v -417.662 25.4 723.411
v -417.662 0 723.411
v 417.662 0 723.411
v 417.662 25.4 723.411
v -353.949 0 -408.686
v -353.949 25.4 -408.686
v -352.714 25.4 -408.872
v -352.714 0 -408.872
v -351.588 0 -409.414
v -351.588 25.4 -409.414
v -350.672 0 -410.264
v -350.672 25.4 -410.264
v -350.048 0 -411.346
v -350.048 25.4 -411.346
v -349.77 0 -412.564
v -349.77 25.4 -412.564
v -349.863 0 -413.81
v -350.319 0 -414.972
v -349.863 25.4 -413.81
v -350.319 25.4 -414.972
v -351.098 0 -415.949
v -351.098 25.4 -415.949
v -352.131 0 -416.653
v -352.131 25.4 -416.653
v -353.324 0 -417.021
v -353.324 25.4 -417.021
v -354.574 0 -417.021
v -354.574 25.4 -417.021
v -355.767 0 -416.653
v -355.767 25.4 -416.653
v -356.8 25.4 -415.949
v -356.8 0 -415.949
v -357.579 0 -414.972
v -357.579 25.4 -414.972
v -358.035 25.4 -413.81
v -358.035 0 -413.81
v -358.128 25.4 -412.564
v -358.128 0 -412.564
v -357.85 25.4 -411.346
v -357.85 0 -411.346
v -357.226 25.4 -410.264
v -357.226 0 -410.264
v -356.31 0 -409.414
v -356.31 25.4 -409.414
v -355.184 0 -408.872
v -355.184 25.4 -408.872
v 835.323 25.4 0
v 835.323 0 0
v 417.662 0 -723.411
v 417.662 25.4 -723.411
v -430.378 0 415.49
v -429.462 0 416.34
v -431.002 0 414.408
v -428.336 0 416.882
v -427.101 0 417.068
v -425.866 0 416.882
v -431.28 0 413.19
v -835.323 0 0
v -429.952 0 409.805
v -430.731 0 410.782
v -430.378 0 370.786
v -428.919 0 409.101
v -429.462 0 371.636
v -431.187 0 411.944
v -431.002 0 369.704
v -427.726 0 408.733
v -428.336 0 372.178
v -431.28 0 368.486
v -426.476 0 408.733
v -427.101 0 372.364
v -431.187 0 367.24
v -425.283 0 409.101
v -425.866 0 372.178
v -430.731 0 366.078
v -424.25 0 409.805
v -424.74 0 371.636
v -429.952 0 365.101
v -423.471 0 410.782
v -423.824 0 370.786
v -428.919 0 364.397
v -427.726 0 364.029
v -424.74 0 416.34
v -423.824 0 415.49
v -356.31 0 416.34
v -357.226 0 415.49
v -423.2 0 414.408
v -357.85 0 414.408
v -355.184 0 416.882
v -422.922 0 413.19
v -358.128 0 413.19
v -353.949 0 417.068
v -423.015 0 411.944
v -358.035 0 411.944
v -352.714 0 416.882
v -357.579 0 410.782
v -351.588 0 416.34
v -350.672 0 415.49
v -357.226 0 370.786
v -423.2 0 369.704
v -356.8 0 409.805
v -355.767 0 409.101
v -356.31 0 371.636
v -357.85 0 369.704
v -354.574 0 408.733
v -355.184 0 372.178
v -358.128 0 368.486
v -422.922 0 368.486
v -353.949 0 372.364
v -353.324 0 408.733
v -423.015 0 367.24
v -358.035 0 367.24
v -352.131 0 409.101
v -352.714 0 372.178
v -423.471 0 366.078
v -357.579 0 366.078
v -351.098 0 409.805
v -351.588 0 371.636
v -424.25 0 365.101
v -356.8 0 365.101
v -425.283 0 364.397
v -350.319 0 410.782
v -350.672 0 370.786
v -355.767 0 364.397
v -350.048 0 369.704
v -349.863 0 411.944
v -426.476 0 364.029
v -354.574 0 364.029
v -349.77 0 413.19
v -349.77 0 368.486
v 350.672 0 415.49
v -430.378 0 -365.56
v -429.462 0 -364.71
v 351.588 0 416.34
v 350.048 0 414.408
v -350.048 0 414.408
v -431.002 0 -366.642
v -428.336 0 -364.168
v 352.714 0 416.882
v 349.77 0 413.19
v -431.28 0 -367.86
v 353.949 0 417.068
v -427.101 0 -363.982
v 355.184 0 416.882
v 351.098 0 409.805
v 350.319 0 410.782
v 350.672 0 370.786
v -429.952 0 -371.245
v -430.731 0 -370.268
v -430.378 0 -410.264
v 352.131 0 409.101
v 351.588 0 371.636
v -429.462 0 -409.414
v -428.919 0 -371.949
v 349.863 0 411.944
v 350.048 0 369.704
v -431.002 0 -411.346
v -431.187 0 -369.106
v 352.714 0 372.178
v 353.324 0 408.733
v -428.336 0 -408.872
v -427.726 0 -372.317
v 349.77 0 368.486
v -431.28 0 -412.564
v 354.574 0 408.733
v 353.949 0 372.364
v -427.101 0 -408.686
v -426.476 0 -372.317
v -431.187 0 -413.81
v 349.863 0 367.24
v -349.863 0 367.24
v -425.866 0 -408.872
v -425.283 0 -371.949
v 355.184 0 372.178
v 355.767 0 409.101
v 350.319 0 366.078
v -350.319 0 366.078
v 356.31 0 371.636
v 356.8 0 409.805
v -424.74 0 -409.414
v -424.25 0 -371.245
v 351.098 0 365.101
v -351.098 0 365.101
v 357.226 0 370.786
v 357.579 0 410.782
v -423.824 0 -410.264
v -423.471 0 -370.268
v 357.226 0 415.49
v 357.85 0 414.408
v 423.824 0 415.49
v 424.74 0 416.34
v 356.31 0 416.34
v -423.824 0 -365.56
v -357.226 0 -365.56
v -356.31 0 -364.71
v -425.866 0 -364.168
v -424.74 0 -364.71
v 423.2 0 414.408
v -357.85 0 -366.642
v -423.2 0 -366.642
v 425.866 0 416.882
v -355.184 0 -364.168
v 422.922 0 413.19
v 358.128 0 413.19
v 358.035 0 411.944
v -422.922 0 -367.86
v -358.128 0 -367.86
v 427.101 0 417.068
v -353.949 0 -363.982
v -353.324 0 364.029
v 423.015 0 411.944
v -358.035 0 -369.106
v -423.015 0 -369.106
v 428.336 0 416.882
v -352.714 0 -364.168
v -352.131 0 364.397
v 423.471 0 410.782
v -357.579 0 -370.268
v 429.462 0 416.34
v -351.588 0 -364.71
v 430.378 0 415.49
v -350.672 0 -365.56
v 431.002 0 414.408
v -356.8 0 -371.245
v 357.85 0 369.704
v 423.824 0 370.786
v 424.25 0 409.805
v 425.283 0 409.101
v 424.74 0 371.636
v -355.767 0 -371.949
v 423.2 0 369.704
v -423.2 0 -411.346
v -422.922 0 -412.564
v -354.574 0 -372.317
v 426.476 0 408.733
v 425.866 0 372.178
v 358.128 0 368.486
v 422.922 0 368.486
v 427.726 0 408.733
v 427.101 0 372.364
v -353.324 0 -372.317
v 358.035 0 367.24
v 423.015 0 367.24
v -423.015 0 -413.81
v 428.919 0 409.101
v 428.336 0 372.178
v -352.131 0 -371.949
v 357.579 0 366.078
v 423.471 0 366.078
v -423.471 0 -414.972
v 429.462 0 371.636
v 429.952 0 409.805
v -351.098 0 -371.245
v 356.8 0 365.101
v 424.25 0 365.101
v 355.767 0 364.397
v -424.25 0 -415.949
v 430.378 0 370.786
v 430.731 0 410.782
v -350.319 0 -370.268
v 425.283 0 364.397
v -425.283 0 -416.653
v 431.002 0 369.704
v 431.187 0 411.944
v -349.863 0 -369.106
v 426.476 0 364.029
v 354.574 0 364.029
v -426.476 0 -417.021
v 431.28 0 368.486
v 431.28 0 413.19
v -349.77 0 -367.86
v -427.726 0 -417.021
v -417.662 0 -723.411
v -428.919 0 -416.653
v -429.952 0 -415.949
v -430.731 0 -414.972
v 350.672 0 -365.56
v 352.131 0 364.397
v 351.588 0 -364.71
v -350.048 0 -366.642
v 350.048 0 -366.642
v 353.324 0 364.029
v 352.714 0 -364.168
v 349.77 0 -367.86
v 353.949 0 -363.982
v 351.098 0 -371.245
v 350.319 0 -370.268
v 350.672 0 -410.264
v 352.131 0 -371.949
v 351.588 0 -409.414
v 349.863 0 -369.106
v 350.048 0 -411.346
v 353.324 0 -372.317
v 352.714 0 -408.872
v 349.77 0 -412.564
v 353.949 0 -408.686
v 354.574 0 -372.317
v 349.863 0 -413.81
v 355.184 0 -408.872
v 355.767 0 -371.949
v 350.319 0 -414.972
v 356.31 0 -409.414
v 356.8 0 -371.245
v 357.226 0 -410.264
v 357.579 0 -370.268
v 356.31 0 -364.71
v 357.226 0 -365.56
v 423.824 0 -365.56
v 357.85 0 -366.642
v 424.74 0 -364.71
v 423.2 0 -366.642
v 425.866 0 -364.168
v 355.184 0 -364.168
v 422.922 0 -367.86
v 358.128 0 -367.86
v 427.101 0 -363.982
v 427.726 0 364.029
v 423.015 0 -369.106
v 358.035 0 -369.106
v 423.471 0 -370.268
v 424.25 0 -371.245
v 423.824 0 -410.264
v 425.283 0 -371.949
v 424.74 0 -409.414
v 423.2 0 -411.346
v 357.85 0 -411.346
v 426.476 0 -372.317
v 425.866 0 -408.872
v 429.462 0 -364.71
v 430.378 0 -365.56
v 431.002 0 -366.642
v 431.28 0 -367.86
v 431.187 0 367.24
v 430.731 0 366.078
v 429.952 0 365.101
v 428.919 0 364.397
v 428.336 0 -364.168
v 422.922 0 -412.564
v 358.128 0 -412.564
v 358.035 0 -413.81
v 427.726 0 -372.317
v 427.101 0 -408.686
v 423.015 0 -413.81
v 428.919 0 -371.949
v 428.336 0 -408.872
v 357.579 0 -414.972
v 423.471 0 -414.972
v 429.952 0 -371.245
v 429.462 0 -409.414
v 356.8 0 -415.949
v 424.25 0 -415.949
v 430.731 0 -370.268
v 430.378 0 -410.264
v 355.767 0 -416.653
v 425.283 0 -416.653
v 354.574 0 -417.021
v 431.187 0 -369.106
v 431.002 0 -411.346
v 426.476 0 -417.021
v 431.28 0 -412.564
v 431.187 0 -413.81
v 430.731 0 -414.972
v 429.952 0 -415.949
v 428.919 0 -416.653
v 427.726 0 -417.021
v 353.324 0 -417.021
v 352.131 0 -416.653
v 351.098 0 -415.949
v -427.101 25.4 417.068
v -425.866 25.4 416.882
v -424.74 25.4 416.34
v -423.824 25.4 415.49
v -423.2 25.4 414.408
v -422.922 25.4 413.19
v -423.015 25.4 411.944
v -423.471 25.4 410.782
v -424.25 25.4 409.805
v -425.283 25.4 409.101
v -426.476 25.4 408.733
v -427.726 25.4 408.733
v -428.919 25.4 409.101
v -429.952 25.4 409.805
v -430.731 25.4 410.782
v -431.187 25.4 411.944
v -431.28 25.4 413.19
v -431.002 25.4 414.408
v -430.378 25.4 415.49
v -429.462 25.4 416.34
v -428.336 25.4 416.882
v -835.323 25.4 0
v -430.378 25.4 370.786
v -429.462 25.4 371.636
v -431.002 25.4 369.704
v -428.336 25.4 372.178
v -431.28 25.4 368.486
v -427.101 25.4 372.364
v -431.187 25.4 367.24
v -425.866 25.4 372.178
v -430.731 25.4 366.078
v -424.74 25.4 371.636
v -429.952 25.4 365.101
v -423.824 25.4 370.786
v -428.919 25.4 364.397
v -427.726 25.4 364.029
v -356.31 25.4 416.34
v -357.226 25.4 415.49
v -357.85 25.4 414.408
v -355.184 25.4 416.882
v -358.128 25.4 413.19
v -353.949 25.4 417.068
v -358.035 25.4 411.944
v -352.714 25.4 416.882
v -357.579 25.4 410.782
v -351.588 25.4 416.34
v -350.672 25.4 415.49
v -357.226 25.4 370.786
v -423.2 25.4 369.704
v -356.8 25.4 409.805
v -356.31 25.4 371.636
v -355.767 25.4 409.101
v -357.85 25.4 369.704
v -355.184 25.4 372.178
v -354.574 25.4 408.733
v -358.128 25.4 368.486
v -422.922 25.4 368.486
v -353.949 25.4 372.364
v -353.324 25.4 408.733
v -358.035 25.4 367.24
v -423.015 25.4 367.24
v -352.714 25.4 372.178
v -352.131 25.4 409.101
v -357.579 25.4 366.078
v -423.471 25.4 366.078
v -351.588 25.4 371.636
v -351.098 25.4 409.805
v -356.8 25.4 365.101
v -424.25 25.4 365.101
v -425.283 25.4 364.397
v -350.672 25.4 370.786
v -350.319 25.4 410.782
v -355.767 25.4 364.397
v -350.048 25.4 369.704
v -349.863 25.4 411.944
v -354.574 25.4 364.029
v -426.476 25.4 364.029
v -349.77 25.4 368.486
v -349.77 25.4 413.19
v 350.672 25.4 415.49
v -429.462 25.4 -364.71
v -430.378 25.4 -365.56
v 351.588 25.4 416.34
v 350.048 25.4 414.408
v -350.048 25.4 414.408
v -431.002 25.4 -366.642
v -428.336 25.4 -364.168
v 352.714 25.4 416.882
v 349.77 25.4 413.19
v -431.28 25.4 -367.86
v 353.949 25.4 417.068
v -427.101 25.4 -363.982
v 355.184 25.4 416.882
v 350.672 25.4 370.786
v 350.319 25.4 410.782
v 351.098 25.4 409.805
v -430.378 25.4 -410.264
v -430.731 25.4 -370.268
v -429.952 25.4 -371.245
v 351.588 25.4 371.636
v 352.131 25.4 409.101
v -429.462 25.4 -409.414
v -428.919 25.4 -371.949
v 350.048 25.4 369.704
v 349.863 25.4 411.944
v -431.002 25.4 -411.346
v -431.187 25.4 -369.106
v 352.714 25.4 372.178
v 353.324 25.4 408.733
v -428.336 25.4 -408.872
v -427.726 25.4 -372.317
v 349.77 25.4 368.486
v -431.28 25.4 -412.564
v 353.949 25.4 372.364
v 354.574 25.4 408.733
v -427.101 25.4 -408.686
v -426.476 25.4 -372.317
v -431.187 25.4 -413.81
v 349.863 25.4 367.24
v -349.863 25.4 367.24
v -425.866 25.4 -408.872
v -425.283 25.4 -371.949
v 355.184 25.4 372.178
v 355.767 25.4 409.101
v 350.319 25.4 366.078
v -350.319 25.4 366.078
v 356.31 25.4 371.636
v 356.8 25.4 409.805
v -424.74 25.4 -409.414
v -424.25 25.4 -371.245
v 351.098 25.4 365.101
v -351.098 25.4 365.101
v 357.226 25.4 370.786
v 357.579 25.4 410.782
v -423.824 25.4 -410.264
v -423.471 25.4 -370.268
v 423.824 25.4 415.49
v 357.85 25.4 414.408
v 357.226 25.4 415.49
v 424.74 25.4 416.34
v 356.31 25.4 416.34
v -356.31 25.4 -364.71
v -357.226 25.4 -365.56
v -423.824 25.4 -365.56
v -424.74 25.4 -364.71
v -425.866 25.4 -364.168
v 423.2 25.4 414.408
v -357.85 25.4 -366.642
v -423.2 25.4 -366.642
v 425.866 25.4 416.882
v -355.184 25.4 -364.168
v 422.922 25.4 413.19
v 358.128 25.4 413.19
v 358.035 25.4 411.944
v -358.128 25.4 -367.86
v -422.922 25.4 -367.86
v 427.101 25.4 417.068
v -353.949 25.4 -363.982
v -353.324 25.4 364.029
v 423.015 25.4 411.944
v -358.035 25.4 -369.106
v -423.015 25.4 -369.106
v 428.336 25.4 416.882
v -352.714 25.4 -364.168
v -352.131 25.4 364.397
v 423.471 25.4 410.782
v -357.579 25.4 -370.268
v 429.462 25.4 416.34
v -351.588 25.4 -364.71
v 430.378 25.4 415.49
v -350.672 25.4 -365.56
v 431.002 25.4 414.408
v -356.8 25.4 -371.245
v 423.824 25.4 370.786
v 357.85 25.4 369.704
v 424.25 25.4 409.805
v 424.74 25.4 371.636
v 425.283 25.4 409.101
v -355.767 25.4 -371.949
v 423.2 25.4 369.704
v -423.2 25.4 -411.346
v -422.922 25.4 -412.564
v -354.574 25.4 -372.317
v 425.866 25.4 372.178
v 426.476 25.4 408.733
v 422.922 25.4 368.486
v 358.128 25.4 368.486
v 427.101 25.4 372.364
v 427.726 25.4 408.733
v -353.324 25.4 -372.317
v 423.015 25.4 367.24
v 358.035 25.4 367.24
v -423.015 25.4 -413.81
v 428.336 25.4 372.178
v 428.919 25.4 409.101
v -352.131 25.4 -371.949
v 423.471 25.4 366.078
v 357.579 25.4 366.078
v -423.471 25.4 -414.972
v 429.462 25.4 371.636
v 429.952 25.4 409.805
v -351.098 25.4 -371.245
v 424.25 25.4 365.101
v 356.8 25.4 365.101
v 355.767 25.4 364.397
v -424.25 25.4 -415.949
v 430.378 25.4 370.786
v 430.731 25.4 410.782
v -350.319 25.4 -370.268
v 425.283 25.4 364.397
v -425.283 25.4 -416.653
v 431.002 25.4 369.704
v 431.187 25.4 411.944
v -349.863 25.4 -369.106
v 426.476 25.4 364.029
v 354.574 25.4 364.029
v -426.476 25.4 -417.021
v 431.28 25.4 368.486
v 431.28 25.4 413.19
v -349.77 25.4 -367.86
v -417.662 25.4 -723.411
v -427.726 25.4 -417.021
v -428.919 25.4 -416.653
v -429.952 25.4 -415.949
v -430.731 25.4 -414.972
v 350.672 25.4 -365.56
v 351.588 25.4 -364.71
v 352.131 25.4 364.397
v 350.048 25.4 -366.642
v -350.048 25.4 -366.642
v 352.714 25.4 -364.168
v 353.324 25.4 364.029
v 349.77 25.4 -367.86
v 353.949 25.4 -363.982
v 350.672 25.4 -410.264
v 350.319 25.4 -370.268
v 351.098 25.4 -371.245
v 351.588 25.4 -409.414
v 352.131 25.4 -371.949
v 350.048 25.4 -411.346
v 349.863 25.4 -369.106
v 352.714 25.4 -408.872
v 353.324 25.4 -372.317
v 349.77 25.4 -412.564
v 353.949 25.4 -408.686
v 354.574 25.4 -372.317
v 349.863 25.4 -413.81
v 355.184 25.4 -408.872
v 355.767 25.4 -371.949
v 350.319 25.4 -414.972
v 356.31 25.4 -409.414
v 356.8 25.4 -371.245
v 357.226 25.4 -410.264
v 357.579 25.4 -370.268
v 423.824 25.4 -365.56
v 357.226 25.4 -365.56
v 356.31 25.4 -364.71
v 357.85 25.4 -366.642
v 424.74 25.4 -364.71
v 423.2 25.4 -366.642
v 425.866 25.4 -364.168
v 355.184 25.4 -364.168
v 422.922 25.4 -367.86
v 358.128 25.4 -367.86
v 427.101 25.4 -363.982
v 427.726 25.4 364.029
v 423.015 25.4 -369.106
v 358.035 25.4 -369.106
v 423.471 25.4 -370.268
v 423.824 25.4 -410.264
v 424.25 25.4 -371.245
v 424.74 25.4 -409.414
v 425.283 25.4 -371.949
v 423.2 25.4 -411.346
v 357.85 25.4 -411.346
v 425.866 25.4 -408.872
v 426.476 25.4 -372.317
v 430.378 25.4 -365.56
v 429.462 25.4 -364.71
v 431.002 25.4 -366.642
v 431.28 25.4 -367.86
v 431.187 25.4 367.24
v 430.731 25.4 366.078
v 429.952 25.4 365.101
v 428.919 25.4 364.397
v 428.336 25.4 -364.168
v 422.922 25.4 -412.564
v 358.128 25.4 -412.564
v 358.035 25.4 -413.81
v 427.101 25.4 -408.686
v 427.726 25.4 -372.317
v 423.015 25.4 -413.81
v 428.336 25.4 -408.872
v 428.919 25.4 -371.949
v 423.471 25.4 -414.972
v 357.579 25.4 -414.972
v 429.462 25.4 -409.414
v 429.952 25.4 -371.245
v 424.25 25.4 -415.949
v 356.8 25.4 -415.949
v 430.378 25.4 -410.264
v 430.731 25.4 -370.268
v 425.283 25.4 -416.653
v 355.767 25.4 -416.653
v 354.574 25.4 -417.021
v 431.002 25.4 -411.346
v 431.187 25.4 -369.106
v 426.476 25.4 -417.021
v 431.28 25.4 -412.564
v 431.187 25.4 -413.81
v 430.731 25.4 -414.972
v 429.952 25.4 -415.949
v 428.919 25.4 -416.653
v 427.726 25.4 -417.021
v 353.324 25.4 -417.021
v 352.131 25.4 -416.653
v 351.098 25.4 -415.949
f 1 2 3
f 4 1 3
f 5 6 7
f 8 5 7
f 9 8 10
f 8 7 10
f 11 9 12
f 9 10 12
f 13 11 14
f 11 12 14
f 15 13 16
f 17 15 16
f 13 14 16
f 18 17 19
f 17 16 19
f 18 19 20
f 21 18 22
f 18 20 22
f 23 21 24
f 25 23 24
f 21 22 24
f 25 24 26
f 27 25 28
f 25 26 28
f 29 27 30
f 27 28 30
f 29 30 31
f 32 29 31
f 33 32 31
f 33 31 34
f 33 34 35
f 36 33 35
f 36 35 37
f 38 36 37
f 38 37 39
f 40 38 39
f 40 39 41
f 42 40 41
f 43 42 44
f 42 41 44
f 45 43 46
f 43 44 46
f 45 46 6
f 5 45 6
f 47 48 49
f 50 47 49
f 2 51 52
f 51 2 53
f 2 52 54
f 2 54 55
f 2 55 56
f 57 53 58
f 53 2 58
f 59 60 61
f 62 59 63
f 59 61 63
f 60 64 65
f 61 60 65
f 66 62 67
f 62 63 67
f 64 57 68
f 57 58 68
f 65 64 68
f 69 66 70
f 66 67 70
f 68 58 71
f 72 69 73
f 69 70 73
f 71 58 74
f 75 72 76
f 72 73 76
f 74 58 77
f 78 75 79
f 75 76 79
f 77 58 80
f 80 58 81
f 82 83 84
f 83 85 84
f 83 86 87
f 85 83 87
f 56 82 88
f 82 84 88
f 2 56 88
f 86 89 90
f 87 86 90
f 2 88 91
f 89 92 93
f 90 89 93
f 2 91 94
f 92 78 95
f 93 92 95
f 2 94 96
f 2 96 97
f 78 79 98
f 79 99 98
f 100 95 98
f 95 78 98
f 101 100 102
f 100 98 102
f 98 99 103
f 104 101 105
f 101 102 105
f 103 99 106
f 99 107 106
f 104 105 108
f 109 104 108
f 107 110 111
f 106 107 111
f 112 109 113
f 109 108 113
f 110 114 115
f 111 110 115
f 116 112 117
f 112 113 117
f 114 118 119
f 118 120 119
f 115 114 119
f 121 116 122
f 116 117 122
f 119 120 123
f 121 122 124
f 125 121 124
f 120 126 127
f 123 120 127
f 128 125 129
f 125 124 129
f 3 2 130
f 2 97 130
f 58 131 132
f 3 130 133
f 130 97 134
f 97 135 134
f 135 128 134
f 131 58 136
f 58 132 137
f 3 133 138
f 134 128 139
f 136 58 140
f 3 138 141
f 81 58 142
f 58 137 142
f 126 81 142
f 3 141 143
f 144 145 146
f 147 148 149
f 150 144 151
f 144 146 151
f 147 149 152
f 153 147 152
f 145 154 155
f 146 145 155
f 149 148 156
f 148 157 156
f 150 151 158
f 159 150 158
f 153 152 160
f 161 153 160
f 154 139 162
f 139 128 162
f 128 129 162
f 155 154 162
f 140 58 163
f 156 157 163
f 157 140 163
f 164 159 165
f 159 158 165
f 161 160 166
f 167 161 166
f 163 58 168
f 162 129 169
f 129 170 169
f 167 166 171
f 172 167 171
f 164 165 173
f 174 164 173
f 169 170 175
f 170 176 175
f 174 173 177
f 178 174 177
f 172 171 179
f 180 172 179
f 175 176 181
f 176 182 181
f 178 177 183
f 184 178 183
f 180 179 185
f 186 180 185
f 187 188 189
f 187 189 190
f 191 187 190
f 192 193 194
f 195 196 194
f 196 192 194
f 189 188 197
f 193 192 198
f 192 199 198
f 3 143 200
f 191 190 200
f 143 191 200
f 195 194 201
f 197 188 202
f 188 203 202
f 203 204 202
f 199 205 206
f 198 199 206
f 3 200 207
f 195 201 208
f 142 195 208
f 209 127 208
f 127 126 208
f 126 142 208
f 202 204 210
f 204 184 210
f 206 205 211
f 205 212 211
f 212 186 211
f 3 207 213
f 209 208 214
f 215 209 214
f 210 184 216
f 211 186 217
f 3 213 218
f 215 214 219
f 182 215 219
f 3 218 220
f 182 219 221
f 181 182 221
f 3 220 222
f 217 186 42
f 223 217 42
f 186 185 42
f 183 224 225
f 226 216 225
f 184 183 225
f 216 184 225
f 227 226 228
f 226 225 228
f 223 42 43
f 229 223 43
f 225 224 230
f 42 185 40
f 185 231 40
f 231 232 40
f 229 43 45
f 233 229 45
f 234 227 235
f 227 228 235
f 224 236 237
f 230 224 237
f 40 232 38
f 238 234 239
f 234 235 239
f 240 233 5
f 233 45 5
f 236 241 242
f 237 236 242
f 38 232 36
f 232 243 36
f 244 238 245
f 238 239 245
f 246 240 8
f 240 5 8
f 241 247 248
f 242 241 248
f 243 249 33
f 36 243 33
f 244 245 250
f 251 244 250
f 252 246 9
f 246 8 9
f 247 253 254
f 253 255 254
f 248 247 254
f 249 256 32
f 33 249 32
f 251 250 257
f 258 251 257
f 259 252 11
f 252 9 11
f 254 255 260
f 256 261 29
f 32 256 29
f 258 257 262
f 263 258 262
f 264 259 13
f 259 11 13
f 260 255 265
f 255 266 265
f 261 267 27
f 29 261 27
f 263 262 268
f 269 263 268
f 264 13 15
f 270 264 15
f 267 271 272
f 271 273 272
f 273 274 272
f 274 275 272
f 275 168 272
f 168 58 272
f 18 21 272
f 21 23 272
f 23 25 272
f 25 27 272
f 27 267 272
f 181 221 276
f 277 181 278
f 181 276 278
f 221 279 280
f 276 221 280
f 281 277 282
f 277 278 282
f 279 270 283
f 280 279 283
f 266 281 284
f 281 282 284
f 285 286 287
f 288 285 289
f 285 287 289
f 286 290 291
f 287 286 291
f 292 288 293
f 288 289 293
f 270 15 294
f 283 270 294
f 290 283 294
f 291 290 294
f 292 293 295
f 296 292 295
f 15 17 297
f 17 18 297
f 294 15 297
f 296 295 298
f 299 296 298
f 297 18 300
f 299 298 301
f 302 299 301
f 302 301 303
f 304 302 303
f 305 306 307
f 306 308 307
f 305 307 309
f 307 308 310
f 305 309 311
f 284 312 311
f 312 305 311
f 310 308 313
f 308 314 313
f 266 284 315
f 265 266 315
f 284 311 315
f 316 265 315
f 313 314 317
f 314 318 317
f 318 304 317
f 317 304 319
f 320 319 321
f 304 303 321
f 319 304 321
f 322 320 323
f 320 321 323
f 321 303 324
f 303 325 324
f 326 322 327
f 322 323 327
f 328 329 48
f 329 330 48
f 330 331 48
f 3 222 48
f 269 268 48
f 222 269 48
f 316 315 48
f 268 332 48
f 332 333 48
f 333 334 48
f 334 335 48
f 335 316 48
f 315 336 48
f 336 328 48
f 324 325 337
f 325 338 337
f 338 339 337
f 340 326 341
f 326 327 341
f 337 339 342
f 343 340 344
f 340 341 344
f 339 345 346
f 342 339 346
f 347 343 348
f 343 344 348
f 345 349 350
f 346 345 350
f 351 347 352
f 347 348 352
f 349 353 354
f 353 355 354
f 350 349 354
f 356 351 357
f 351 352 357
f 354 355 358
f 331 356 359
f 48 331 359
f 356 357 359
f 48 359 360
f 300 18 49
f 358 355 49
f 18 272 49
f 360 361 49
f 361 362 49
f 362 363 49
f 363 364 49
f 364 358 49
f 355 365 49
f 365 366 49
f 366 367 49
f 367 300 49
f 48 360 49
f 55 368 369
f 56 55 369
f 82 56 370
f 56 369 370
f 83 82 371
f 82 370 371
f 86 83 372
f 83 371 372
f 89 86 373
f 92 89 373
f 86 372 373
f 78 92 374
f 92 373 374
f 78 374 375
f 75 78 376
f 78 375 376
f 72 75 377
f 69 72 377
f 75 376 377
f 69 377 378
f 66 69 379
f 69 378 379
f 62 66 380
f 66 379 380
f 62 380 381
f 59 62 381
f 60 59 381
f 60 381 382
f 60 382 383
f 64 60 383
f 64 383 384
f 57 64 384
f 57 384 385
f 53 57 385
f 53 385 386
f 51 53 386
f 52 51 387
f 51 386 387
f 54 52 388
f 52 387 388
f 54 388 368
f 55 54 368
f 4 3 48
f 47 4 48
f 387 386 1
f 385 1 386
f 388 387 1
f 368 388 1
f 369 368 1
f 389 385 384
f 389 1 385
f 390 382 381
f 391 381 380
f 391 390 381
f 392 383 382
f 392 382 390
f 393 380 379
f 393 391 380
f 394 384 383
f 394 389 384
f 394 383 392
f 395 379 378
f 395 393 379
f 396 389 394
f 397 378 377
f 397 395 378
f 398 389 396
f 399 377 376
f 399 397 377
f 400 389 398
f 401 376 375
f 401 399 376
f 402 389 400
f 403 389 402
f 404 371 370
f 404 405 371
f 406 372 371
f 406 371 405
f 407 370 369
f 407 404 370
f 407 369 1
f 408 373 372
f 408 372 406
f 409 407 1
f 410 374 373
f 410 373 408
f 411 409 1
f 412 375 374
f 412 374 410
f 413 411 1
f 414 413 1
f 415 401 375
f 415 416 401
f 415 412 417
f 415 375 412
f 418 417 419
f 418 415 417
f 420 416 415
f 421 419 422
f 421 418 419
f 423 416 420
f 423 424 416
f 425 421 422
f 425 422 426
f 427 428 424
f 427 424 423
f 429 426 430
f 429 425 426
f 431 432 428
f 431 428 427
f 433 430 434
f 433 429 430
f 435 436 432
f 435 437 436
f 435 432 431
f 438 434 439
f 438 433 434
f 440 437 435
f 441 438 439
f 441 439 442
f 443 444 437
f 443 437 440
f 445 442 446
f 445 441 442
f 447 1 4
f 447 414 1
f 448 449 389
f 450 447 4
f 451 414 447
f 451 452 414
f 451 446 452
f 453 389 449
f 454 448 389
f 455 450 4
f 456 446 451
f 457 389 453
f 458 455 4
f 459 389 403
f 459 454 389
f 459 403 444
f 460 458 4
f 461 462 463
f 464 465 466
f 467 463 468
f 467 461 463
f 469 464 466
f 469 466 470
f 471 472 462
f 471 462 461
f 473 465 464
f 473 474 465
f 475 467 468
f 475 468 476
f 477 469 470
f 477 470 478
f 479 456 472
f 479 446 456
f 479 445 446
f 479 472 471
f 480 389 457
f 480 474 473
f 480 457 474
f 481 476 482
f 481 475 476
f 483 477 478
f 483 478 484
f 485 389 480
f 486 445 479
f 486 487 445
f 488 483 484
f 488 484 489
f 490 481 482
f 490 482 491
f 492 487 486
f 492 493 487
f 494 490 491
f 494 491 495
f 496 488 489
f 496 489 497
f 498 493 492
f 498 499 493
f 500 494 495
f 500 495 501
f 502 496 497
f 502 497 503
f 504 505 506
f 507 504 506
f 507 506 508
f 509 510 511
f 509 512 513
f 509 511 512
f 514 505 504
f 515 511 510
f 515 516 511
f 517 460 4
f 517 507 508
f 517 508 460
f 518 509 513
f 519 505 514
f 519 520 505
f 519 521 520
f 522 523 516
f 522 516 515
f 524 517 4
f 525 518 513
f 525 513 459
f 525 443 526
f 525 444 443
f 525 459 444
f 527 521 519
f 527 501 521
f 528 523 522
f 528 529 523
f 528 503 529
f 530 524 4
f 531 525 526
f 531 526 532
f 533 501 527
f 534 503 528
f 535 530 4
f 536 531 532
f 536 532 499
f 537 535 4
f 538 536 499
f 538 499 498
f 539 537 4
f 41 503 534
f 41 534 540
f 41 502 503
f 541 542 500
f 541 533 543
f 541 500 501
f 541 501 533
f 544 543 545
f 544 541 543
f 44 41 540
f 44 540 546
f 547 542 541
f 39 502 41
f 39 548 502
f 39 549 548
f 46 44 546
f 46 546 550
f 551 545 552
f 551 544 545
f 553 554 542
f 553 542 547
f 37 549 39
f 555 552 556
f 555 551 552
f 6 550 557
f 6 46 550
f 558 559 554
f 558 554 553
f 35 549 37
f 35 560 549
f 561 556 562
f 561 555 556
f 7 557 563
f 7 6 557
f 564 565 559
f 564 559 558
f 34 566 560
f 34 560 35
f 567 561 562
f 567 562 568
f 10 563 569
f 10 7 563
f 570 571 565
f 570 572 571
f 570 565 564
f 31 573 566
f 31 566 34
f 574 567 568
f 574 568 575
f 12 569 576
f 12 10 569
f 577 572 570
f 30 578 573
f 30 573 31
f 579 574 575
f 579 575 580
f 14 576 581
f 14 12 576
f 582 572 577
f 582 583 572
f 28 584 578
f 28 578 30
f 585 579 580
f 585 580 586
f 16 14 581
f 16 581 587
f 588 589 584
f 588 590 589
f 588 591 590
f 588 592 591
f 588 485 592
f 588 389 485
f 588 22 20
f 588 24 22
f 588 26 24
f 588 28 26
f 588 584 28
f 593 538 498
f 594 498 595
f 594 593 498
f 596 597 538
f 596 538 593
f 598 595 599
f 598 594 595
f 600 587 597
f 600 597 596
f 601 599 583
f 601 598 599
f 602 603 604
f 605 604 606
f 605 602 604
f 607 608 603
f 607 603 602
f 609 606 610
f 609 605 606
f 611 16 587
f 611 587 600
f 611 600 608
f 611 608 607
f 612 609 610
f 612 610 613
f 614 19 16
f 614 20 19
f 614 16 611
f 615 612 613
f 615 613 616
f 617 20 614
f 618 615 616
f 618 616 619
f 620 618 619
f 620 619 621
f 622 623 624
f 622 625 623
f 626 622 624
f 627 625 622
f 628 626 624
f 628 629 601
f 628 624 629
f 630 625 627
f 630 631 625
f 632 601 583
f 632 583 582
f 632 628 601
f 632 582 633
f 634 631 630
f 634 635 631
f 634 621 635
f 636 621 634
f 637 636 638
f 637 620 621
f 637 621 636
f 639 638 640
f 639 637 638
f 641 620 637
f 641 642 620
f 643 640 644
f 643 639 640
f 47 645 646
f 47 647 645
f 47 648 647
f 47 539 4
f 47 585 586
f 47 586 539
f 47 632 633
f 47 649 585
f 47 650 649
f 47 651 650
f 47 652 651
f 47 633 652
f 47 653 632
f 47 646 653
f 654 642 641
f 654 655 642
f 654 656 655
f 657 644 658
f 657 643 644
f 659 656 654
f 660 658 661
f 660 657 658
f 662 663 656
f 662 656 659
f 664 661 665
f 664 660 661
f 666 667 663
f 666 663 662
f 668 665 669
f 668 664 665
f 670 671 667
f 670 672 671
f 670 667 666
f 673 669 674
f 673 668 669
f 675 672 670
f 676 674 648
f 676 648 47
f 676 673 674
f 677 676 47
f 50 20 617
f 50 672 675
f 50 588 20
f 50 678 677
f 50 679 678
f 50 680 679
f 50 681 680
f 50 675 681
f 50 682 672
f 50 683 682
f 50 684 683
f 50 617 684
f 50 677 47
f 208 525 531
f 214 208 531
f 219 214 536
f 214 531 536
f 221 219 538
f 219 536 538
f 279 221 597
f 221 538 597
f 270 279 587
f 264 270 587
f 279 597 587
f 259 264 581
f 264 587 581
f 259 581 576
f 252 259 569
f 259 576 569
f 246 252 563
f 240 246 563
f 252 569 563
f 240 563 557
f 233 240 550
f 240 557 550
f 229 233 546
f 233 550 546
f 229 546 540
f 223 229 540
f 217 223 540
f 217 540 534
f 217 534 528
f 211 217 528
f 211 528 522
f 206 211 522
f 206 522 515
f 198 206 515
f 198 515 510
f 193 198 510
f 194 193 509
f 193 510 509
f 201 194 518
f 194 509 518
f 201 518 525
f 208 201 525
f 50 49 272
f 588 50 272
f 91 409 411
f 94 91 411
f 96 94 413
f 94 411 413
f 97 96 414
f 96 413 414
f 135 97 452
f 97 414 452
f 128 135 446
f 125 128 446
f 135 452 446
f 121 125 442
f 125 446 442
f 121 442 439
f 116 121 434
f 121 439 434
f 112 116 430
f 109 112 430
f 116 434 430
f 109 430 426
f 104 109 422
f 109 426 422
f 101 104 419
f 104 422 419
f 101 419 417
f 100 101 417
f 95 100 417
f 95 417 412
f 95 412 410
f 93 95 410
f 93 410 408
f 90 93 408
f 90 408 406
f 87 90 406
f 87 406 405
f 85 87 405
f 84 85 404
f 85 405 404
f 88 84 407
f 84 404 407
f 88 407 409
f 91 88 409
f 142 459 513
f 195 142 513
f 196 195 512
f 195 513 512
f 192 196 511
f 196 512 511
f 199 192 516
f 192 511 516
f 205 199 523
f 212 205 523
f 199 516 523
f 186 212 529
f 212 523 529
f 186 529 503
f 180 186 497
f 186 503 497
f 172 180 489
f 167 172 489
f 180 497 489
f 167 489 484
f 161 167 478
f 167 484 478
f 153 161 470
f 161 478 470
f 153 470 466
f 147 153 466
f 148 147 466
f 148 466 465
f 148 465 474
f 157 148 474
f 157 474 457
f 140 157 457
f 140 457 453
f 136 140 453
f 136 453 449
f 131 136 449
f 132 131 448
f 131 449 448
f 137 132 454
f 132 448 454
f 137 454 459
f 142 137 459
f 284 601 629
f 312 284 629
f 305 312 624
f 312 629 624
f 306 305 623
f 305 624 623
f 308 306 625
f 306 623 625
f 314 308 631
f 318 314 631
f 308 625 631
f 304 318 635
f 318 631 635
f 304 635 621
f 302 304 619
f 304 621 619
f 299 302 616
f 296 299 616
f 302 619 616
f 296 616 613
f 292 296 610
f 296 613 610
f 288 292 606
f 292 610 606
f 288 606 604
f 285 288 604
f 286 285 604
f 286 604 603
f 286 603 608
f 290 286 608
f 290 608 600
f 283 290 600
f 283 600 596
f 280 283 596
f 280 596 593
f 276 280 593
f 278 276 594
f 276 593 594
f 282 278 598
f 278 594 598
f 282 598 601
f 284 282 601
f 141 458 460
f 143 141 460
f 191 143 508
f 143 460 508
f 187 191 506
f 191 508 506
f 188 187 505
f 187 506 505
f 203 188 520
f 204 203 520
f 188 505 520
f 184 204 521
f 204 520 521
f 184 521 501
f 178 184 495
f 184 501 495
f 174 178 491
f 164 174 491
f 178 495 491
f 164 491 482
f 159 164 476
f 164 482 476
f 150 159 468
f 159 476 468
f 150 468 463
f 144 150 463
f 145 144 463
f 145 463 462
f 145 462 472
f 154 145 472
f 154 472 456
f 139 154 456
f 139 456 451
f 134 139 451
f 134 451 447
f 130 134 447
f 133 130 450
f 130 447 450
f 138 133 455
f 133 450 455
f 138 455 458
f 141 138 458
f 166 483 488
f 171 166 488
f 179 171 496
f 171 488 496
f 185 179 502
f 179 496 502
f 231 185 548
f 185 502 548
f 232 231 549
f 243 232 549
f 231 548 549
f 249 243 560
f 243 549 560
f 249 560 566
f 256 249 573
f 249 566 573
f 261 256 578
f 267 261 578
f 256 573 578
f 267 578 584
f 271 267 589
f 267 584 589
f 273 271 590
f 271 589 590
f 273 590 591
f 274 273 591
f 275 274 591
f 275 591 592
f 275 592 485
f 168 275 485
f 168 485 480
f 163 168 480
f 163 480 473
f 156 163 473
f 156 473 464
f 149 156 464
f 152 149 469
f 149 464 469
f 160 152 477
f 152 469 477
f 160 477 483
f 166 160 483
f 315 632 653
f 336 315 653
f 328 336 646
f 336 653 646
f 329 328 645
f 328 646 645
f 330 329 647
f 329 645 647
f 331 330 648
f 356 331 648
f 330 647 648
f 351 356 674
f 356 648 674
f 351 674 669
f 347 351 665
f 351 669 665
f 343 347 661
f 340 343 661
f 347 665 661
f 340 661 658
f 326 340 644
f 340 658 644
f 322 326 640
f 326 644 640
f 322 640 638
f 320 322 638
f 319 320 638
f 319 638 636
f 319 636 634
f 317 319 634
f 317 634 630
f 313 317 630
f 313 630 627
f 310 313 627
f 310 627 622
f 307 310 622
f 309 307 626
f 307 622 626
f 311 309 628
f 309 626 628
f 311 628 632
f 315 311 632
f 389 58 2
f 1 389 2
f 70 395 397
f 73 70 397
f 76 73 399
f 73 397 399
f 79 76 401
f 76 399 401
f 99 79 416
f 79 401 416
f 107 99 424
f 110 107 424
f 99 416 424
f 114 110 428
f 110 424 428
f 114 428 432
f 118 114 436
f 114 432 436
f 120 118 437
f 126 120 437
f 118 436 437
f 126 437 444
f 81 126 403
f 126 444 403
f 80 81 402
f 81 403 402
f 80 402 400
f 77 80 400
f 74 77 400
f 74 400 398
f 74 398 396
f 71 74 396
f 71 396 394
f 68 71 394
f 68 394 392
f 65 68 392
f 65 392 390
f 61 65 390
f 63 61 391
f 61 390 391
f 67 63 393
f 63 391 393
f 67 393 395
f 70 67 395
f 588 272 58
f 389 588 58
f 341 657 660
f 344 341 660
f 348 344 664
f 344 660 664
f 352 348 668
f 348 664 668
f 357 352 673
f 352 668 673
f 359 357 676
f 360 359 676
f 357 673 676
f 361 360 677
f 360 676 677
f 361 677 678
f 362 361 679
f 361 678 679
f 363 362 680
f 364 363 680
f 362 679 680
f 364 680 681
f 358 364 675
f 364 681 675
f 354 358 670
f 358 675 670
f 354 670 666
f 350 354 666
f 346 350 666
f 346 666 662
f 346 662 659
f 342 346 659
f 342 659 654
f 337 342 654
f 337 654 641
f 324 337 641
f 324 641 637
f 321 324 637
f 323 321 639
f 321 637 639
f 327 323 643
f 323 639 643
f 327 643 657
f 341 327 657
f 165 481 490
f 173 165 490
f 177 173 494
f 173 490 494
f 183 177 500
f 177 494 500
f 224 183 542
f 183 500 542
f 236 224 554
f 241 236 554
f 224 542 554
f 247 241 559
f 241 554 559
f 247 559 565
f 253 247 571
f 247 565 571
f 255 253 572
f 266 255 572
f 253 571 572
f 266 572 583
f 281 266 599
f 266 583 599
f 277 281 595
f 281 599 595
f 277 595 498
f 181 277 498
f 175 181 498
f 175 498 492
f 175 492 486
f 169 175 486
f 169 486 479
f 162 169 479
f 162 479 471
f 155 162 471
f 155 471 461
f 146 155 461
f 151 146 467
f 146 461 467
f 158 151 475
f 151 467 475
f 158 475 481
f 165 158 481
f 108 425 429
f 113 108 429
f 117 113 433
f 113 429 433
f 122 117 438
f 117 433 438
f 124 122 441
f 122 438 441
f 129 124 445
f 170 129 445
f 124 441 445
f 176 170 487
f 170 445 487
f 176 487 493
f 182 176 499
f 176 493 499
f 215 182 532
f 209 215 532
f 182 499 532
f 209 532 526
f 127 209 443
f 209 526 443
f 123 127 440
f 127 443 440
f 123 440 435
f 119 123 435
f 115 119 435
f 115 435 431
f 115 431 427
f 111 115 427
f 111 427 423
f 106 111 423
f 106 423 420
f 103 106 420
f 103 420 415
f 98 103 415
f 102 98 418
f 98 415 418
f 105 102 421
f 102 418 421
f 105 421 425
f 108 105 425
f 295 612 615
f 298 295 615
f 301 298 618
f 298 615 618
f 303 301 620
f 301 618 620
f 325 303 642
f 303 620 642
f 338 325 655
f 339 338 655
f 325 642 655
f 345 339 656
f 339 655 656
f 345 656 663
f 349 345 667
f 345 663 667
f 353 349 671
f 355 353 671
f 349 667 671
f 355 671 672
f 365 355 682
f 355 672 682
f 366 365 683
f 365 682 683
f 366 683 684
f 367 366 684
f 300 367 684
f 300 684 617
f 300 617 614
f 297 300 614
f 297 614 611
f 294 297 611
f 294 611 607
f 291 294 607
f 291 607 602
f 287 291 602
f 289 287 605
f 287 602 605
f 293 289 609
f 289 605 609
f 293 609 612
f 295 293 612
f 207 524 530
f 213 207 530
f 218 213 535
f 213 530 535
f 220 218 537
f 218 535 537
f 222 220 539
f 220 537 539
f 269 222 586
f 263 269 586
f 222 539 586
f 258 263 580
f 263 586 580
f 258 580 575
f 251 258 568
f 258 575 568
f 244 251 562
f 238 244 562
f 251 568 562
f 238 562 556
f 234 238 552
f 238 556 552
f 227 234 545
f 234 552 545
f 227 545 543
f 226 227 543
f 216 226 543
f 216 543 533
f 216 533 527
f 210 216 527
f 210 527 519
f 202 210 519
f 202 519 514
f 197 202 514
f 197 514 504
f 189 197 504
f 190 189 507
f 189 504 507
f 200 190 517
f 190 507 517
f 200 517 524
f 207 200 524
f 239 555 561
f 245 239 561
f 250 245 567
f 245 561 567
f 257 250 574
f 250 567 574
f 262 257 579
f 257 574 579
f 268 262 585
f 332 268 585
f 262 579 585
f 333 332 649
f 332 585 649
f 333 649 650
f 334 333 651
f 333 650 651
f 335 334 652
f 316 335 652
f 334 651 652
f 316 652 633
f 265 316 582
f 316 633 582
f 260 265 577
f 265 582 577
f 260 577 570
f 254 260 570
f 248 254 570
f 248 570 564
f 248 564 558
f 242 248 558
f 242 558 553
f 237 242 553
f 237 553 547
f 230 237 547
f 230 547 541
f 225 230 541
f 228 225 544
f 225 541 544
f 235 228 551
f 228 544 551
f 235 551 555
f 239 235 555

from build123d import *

# Parameters (mm, degrees)
BOSS_EXTRUDE1_DEPTH = 25.4
SKETCH5_R           = 4.191
CUT_EXTRUDE1_DEPTH  = 25.4


with BuildPart() as part:
    # Sketch1 → Boss-Extrude1 (new body)
    with BuildSketch(Plane(origin=(0, 0, 0), x_dir=(1, 0, 0), z_dir=(0, 1, 0))):
        Polygon((835.323484187, 0), (417.661742094, 723.411357684), (-417.661742094, 723.411357684), (-835.323484187, 0), (-417.661742094, -723.411357684), (417.661742094, -723.411357684), align=None)
    extrude(amount=BOSS_EXTRUDE1_DEPTH)

    # Sketch5 → Cut-Extrude1 (cut)
    with BuildSketch(Plane(origin=(0, 25.4, 0), x_dir=(1, 0, 0), z_dir=(0, 1, 0))):
        with Locations(Location((-353.949, 412.877, 0), (0, 0, 270))):
            Circle(SKETCH5_R)
        with Locations(Location((-427.101, 412.877, 0), (0, 0, 270))):
            Circle(SKETCH5_R)
        with Locations(Location((-427.101, 368.173, 0), (0, 0, 270))):
            Circle(SKETCH5_R)
        with Locations(Location((-353.949, 368.173, 0), (0, 0, 270))):
            Circle(SKETCH5_R)
        with Locations(Location((353.949, 368.173, 0), (0, 0, 270))):
            Circle(SKETCH5_R)
        with Locations(Location((427.101, 368.173, 0), (0, 0, 270))):
            Circle(SKETCH5_R)
        with Locations(Location((427.101, 412.877, 0), (0, 0, 270))):
            Circle(SKETCH5_R)
        with Locations(Location((353.949, 412.877, 0), (0, 0, 270))):
            Circle(SKETCH5_R)
        with Locations(Location((353.949, -412.877, 0), (0, 0, 270))):
            Circle(SKETCH5_R)
        with Locations(Location((427.101, -412.877, 0), (0, 0, 270))):
            Circle(SKETCH5_R)
        with Locations(Location((427.101, -368.173, 0), (0, 0, 270))):
            Circle(SKETCH5_R)
        with Locations(Location((353.949, -368.173, 0), (0, 0, 270))):
            Circle(SKETCH5_R)
        with Locations(Location((-353.949, -368.173, 0), (0, 0, 270))):
            Circle(SKETCH5_R)
        with Locations(Location((-427.101, -368.173, 0), (0, 0, 270))):
            Circle(SKETCH5_R)
        with Locations(Location((-427.101, -412.877, 0), (0, 0, 270))):
            Circle(SKETCH5_R)
        with Locations(Location((-353.949, -412.877, 0), (0, 0, 270))):
            Circle(SKETCH5_R)
    extrude(amount=-CUT_EXTRUDE1_DEPTH, mode=Mode.SUBTRACT)


solid = part.part
